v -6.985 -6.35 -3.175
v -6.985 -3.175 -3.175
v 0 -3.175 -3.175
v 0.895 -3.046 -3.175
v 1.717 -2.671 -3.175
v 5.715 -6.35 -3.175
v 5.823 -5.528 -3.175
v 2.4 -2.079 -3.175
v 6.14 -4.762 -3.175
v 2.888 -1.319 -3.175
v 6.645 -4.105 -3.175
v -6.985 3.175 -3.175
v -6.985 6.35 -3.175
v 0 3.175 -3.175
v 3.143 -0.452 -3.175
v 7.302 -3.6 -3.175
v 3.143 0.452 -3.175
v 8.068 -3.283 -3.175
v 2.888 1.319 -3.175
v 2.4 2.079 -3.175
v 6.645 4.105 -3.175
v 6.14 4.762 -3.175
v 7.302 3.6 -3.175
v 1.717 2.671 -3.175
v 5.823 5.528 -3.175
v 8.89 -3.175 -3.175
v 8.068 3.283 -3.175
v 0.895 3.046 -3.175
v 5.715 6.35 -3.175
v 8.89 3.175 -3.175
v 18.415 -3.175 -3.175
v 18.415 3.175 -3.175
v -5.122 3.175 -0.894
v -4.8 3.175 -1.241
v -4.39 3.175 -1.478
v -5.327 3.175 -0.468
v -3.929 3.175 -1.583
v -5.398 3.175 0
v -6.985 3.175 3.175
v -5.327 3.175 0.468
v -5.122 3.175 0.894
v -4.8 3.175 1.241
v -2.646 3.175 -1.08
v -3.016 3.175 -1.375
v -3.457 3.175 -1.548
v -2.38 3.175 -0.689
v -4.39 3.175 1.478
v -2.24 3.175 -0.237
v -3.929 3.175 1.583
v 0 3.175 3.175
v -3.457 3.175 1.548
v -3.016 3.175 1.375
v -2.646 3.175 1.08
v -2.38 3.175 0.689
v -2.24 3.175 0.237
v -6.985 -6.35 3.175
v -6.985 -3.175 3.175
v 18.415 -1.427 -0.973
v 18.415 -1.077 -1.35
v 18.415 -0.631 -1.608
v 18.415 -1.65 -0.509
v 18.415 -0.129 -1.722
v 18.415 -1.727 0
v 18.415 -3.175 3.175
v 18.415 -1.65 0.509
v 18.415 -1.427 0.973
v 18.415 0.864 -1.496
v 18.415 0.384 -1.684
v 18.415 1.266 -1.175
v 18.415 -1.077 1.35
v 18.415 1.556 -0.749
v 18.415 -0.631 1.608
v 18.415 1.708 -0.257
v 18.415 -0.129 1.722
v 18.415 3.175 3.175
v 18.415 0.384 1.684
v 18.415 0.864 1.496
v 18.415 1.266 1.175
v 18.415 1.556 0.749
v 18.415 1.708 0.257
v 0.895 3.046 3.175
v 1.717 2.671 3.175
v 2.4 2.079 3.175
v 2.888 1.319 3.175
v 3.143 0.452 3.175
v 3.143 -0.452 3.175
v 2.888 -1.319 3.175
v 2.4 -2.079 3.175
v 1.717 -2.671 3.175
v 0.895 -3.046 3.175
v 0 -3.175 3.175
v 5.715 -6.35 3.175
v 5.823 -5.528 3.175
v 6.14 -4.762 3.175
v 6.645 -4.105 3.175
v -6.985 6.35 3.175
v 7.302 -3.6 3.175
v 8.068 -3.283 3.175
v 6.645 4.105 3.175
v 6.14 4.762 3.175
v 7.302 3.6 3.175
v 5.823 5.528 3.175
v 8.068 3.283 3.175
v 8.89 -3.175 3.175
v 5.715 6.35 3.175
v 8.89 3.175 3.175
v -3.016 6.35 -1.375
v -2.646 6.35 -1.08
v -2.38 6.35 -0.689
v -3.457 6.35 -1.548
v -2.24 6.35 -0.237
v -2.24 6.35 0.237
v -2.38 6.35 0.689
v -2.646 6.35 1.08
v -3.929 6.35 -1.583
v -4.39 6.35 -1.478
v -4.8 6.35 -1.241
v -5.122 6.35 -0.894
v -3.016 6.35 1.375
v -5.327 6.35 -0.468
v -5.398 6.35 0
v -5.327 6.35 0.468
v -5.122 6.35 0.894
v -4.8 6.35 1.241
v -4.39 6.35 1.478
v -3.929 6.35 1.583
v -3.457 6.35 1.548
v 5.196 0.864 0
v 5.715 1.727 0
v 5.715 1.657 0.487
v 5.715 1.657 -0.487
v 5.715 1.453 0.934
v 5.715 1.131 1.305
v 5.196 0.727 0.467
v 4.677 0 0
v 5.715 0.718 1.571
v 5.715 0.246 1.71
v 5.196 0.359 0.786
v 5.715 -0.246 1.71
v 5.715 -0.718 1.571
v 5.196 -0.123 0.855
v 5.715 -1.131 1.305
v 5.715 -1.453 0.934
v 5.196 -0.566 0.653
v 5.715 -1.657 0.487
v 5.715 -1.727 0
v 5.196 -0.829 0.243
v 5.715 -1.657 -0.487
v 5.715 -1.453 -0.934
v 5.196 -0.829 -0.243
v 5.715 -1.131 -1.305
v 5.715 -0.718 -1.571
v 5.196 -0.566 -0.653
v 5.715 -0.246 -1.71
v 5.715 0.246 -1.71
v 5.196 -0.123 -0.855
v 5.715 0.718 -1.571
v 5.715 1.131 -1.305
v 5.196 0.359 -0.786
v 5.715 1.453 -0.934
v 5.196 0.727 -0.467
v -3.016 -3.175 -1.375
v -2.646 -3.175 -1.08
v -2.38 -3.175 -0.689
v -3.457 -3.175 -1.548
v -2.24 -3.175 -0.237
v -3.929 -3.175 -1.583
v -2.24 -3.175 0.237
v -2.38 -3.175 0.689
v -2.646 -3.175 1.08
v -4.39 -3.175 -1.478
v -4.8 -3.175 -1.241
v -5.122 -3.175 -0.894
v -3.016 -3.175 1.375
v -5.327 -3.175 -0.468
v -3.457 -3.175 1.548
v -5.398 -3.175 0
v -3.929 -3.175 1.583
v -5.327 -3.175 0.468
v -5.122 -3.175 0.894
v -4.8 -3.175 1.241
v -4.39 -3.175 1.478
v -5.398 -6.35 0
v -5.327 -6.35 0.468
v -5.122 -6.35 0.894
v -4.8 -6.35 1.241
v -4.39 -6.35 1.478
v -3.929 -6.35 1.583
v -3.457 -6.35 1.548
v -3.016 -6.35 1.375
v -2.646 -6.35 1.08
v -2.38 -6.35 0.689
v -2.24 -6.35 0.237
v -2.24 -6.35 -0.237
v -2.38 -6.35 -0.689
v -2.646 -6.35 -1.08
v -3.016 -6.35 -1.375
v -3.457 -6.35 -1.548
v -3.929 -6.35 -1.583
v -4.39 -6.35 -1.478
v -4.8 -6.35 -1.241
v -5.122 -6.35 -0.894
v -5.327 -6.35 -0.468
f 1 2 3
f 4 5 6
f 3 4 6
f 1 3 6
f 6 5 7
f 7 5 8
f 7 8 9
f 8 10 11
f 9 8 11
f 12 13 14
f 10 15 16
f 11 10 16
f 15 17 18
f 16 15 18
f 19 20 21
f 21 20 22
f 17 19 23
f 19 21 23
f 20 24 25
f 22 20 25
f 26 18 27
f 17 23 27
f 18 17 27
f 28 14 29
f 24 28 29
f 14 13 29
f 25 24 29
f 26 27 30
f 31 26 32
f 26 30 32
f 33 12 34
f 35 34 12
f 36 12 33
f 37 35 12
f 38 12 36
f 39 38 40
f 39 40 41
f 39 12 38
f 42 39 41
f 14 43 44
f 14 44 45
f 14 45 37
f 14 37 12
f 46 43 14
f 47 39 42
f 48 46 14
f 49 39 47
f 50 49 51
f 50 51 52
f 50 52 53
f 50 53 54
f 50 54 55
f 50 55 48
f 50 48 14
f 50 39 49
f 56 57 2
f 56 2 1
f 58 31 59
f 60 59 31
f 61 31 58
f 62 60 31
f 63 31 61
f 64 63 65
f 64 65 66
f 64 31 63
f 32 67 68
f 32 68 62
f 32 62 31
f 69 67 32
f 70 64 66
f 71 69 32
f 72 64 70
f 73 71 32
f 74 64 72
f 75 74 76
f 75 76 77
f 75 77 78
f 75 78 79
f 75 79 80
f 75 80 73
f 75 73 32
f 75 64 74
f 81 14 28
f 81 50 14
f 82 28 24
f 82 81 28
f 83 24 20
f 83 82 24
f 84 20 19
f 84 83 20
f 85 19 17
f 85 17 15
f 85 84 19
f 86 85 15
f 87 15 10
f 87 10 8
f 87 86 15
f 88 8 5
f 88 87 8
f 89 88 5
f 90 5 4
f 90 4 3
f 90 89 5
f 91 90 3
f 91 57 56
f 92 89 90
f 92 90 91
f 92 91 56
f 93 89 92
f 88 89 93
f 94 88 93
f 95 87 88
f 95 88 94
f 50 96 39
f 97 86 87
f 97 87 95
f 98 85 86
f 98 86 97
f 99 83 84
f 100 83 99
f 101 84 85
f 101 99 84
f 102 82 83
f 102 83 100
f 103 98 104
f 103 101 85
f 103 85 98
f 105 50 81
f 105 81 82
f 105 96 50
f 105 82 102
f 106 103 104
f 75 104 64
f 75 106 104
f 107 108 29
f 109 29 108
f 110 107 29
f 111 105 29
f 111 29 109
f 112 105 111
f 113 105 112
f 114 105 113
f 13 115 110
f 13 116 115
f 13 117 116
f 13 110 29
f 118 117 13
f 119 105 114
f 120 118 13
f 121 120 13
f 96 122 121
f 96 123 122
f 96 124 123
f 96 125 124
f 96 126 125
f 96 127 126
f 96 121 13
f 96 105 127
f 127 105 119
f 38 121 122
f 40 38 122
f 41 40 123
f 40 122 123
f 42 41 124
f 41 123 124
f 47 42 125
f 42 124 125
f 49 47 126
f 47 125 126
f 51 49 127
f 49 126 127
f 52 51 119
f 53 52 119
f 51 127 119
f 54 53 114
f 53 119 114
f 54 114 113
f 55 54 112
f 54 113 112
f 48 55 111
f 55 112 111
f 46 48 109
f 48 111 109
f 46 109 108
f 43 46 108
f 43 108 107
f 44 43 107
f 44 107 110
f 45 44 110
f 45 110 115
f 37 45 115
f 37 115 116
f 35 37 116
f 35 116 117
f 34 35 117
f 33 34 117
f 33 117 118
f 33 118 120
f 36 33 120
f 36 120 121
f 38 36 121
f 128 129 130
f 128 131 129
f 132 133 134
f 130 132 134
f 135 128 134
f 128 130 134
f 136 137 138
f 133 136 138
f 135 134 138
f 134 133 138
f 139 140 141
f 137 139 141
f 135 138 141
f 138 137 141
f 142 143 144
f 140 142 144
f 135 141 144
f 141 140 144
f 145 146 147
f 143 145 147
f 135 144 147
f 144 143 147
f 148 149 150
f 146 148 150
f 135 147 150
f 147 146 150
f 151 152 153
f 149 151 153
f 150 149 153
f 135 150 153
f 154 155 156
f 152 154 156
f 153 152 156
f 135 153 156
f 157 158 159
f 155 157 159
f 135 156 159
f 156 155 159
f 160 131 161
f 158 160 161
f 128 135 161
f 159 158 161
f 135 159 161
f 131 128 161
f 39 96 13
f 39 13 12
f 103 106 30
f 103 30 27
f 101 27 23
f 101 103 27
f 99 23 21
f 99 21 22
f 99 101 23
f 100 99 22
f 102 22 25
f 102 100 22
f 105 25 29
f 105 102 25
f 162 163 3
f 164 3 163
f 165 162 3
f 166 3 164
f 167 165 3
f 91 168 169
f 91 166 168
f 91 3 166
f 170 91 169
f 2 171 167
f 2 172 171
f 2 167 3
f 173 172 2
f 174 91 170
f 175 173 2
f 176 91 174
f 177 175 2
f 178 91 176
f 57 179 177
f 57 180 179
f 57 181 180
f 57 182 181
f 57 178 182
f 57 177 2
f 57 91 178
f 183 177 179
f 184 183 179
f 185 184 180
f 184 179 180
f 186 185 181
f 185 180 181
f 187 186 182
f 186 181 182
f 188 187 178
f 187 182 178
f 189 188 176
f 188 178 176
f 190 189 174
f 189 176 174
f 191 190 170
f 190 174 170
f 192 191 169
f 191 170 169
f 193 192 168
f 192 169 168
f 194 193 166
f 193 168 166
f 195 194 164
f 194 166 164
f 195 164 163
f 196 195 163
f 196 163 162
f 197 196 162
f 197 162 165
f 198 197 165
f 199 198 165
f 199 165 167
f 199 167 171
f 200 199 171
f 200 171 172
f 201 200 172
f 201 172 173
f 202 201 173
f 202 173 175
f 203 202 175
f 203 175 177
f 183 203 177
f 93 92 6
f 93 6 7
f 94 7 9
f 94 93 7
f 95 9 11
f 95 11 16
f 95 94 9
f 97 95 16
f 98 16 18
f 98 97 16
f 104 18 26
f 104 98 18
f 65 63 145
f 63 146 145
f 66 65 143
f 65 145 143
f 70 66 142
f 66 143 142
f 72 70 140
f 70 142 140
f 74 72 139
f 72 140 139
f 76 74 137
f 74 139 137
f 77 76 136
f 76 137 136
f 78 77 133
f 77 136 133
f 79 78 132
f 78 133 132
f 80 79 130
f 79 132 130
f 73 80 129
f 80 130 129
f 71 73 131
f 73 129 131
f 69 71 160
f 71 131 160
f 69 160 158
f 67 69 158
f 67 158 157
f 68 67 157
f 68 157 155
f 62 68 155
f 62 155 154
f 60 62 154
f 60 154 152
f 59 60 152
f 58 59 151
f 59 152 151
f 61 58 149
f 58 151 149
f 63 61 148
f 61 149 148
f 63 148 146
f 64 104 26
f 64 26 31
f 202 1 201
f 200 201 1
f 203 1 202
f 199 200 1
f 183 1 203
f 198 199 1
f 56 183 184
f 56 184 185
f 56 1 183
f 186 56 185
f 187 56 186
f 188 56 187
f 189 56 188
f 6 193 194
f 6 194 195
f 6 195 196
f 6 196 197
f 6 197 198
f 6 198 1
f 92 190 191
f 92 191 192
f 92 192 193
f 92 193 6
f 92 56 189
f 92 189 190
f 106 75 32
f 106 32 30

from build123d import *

# Parameters (mm, degrees)
F1_DEPTH = 3.175
F3_D     = 3.4544
F3_DEPTH = 12.7
F3_TIP   = 1.0378064612
F5_D     = 3.175


with BuildPart() as f1:
    # F0 (on Top) → F1 (new body, symmetric)
    with BuildSketch(Plane.XY):
        with BuildLine():
            Line((0, -3.175), (-6.985, -3.175))
            Line((-6.985, -3.175), (-6.985, -6.35))
            Line((-6.985, -6.35), (5.715, -6.35))
            ThreePointArc((5.715, -6.35), (6.6449359697, -4.1049359697), (8.89, -3.175))
            Line((8.89, -3.175), (18.415, -3.175))
            Line((18.415, -3.175), (18.415, 3.175))
            Line((18.415, 3.175), (8.89, 3.175))
            ThreePointArc((8.89, 3.175), (6.6449359697, 4.1049359697), (5.715, 6.35))
            Line((5.715, 6.35), (-6.985, 6.35))
            Line((-6.985, 6.35), (-6.985, 3.175))
            Line((-6.985, 3.175), (0, 3.175))
            ThreePointArc((0, 3.175), (3.175, 0), (0, -3.175))
        make_face()
    extrude(amount=F1_DEPTH, both=True)

    # F3
    with Locations(Plane.YZ.offset(18.415)):
        with Locations((0, 0)):
            Hole(F3_D / 2, depth=F3_DEPTH)
            with Locations((0, 0, -(F3_DEPTH + F3_TIP / 2))):  # 118° drill point
                Cone(0, F3_D / 2, F3_TIP, mode=Mode.SUBTRACT)

    # F5 (through all)
    with Locations(Plane.XZ.offset(6.35)):
        with Locations((-3.81, 0)):
            Hole(F5_D / 2)


solid = f1.part
